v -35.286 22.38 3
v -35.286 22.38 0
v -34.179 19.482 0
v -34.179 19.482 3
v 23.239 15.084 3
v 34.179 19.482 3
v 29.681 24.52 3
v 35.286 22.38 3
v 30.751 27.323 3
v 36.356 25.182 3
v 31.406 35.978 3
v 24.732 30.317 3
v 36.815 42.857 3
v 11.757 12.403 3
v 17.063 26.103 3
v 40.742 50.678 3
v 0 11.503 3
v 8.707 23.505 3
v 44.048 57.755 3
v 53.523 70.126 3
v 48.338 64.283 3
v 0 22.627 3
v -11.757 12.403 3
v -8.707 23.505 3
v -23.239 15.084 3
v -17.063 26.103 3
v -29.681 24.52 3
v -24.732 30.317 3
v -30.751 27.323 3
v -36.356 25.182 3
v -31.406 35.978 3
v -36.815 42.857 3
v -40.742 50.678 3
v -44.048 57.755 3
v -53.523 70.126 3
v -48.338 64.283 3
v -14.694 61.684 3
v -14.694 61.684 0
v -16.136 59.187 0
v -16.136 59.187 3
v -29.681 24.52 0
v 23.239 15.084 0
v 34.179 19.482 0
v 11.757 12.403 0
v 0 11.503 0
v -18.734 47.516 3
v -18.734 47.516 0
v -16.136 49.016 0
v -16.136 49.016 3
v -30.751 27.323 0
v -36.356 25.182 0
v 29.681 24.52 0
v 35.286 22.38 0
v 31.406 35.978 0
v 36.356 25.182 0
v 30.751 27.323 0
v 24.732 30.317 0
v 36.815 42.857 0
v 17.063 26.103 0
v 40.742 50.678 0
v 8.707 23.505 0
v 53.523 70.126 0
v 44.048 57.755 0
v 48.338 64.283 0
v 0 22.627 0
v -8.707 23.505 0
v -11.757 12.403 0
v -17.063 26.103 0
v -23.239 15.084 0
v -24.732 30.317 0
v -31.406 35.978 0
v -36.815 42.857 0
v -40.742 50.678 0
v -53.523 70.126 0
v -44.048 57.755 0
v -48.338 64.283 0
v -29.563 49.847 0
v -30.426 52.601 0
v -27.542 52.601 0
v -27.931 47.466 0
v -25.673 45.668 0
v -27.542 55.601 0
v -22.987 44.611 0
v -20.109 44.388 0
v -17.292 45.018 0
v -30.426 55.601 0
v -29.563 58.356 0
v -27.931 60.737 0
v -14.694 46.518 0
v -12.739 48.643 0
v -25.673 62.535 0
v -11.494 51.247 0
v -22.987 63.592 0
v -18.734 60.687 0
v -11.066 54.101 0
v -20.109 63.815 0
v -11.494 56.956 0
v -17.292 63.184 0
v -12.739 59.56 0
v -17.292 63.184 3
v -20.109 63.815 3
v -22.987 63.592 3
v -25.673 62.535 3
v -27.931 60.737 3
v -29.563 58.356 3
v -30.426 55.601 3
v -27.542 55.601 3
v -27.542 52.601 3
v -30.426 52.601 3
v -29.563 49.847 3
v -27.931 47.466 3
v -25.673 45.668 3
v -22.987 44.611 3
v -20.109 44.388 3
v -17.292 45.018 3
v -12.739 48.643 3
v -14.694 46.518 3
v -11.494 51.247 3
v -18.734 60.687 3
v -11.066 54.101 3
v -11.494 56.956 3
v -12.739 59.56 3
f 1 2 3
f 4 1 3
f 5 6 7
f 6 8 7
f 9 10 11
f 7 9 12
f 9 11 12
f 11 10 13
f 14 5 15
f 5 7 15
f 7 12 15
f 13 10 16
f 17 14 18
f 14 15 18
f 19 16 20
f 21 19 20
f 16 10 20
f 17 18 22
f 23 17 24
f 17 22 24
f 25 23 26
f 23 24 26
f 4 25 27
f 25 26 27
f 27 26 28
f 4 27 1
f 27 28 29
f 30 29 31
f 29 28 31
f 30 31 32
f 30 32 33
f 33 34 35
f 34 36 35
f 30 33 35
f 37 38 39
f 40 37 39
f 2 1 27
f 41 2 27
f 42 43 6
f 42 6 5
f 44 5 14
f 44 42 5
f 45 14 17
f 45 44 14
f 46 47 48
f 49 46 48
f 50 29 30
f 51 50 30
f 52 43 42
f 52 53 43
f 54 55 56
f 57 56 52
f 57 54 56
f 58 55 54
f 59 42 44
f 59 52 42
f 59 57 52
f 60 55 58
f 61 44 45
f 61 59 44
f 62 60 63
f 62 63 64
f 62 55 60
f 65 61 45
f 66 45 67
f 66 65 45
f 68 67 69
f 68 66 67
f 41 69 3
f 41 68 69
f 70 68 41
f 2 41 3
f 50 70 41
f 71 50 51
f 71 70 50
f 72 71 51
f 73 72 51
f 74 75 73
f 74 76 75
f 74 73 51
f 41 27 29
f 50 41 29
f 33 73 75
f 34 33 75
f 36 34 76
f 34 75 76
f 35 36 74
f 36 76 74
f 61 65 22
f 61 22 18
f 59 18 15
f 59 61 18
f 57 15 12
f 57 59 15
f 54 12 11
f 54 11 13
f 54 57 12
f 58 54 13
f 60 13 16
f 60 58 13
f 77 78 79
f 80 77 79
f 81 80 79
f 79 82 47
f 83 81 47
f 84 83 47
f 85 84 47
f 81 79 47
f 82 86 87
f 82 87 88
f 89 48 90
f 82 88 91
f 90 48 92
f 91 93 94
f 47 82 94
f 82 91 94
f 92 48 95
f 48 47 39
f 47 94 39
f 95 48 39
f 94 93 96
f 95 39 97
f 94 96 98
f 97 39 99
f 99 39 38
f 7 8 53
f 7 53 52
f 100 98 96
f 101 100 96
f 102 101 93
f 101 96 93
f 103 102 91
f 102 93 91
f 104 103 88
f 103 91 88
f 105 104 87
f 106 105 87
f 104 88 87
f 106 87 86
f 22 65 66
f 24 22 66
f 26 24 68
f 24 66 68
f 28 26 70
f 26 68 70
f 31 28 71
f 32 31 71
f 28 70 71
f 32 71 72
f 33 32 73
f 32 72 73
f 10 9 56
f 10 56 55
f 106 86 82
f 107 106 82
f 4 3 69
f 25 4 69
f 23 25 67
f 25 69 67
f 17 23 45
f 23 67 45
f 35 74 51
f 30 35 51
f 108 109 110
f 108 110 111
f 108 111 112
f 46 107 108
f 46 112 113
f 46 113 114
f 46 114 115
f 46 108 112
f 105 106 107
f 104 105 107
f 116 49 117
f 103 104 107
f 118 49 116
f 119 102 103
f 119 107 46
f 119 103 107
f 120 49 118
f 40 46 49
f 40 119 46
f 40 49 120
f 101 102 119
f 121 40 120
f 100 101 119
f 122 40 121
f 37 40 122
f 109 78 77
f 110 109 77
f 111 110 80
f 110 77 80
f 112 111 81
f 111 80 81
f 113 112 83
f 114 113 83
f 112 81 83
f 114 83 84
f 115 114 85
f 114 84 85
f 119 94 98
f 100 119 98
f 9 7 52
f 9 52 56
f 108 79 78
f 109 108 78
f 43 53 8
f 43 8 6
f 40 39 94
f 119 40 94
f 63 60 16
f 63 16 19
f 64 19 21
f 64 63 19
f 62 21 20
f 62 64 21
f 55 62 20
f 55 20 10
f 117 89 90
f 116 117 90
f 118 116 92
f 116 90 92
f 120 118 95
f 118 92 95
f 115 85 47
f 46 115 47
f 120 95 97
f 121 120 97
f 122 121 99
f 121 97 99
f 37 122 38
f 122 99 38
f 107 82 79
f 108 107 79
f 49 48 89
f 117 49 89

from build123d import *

# Parameters (mm, degrees)
F1_DEPTH = 3
F3_DEPTH = 25
F6_DEPTH = 3


with BuildPart() as f1:
    # F0 (on Top) → F1 (new body)
    with BuildSketch(Plane.XY):
        with BuildLine():
            ThreePointArc((0, 22.6265797497), (-24.7324129751, 30.3174399754), (-40.7420173483, 50.6775517235))
            ThreePointArc((-40.7420173483, 50.6775517235), (-46.0755119449, 61.0963779092), (-53.5229284021, 70.1260009251))
            Line((-53.5229284021, 70.1260009251), (-34.1787936319, 19.4819811072))
            ThreePointArc((-34.1787936319, 19.4819811072), (-17.5489172861, 13.5240247389), (0, 11.5027544827))
            Line((0, 11.5027544827), (0, 22.6265797497))
        make_face()
    extrude(amount=F1_DEPTH)

    # F2 (on face) → F3 (cut)
    with BuildSketch(Plane.XY.offset(3)):
        Polygon((-35.2855414011, 22.3795082711), (-29.6805013641, 24.5204254072), (-30.7509599322, 27.3229454257), (-36.3559999692, 25.1820282896), align=None)
    extrude(amount=-F3_DEPTH, mode=Mode.SUBTRACT)

    # F4: F1 across face


with BuildPart() as f1_1:
    add(f1.part)
    add(f1.part.mirror(Plane(origin=(0, 17.0646671162, 1.5), x_dir=(0, 1, 0), z_dir=(1, 0, 0))))


with BuildPart() as f6:
    # F5 (on Top) → F6 (new body)
    with BuildSketch(Plane.XY):
        with BuildLine():
            ThreePointArc((-14.6939180594, 46.518436245), (-12.0195063409, 49.8982193612), (-11.0657635942, 54.1012880884))
            ThreePointArc((-11.0657635942, 54.1012880884), (-12.0195063409, 58.3043568157), (-14.6939180594, 61.6841399319))
            Line((-14.6939180594, 61.6841399319), (-16.1358089014, 59.1867117345))
            Line((-16.1358089014, 59.1867117345), (-18.7338851128, 60.6867117345))
            Line((-18.7338851128, 60.6867117345), (-17.2919942707, 63.1841399319))
            ThreePointArc((-17.2919942707, 63.1841399319), (-25.6730138329, 62.5347879459), (-30.4258789299, 55.6012880884))
            Line((-30.4258789299, 55.6012880884), (-27.5420972458, 55.6012880884))
            Line((-27.5420972458, 55.6012880884), (-27.5420972458, 52.6012880884))
            Line((-27.5420972458, 52.6012880884), (-30.4258789299, 52.6012880884))
            ThreePointArc((-30.4258789299, 52.6012880884), (-25.6730138329, 45.667788231), (-17.2919942707, 45.018436245))
            Line((-17.2919942707, 45.018436245), (-18.7338851128, 47.5158644424))
            Line((-18.7338851128, 47.5158644424), (-16.1358089014, 49.0158644424))
            Line((-16.1358089014, 49.0158644424), (-14.6939180594, 46.518436245))
        make_face()
    extrude(amount=F6_DEPTH)


solid = Compound([f1_1.part, f6.part])
